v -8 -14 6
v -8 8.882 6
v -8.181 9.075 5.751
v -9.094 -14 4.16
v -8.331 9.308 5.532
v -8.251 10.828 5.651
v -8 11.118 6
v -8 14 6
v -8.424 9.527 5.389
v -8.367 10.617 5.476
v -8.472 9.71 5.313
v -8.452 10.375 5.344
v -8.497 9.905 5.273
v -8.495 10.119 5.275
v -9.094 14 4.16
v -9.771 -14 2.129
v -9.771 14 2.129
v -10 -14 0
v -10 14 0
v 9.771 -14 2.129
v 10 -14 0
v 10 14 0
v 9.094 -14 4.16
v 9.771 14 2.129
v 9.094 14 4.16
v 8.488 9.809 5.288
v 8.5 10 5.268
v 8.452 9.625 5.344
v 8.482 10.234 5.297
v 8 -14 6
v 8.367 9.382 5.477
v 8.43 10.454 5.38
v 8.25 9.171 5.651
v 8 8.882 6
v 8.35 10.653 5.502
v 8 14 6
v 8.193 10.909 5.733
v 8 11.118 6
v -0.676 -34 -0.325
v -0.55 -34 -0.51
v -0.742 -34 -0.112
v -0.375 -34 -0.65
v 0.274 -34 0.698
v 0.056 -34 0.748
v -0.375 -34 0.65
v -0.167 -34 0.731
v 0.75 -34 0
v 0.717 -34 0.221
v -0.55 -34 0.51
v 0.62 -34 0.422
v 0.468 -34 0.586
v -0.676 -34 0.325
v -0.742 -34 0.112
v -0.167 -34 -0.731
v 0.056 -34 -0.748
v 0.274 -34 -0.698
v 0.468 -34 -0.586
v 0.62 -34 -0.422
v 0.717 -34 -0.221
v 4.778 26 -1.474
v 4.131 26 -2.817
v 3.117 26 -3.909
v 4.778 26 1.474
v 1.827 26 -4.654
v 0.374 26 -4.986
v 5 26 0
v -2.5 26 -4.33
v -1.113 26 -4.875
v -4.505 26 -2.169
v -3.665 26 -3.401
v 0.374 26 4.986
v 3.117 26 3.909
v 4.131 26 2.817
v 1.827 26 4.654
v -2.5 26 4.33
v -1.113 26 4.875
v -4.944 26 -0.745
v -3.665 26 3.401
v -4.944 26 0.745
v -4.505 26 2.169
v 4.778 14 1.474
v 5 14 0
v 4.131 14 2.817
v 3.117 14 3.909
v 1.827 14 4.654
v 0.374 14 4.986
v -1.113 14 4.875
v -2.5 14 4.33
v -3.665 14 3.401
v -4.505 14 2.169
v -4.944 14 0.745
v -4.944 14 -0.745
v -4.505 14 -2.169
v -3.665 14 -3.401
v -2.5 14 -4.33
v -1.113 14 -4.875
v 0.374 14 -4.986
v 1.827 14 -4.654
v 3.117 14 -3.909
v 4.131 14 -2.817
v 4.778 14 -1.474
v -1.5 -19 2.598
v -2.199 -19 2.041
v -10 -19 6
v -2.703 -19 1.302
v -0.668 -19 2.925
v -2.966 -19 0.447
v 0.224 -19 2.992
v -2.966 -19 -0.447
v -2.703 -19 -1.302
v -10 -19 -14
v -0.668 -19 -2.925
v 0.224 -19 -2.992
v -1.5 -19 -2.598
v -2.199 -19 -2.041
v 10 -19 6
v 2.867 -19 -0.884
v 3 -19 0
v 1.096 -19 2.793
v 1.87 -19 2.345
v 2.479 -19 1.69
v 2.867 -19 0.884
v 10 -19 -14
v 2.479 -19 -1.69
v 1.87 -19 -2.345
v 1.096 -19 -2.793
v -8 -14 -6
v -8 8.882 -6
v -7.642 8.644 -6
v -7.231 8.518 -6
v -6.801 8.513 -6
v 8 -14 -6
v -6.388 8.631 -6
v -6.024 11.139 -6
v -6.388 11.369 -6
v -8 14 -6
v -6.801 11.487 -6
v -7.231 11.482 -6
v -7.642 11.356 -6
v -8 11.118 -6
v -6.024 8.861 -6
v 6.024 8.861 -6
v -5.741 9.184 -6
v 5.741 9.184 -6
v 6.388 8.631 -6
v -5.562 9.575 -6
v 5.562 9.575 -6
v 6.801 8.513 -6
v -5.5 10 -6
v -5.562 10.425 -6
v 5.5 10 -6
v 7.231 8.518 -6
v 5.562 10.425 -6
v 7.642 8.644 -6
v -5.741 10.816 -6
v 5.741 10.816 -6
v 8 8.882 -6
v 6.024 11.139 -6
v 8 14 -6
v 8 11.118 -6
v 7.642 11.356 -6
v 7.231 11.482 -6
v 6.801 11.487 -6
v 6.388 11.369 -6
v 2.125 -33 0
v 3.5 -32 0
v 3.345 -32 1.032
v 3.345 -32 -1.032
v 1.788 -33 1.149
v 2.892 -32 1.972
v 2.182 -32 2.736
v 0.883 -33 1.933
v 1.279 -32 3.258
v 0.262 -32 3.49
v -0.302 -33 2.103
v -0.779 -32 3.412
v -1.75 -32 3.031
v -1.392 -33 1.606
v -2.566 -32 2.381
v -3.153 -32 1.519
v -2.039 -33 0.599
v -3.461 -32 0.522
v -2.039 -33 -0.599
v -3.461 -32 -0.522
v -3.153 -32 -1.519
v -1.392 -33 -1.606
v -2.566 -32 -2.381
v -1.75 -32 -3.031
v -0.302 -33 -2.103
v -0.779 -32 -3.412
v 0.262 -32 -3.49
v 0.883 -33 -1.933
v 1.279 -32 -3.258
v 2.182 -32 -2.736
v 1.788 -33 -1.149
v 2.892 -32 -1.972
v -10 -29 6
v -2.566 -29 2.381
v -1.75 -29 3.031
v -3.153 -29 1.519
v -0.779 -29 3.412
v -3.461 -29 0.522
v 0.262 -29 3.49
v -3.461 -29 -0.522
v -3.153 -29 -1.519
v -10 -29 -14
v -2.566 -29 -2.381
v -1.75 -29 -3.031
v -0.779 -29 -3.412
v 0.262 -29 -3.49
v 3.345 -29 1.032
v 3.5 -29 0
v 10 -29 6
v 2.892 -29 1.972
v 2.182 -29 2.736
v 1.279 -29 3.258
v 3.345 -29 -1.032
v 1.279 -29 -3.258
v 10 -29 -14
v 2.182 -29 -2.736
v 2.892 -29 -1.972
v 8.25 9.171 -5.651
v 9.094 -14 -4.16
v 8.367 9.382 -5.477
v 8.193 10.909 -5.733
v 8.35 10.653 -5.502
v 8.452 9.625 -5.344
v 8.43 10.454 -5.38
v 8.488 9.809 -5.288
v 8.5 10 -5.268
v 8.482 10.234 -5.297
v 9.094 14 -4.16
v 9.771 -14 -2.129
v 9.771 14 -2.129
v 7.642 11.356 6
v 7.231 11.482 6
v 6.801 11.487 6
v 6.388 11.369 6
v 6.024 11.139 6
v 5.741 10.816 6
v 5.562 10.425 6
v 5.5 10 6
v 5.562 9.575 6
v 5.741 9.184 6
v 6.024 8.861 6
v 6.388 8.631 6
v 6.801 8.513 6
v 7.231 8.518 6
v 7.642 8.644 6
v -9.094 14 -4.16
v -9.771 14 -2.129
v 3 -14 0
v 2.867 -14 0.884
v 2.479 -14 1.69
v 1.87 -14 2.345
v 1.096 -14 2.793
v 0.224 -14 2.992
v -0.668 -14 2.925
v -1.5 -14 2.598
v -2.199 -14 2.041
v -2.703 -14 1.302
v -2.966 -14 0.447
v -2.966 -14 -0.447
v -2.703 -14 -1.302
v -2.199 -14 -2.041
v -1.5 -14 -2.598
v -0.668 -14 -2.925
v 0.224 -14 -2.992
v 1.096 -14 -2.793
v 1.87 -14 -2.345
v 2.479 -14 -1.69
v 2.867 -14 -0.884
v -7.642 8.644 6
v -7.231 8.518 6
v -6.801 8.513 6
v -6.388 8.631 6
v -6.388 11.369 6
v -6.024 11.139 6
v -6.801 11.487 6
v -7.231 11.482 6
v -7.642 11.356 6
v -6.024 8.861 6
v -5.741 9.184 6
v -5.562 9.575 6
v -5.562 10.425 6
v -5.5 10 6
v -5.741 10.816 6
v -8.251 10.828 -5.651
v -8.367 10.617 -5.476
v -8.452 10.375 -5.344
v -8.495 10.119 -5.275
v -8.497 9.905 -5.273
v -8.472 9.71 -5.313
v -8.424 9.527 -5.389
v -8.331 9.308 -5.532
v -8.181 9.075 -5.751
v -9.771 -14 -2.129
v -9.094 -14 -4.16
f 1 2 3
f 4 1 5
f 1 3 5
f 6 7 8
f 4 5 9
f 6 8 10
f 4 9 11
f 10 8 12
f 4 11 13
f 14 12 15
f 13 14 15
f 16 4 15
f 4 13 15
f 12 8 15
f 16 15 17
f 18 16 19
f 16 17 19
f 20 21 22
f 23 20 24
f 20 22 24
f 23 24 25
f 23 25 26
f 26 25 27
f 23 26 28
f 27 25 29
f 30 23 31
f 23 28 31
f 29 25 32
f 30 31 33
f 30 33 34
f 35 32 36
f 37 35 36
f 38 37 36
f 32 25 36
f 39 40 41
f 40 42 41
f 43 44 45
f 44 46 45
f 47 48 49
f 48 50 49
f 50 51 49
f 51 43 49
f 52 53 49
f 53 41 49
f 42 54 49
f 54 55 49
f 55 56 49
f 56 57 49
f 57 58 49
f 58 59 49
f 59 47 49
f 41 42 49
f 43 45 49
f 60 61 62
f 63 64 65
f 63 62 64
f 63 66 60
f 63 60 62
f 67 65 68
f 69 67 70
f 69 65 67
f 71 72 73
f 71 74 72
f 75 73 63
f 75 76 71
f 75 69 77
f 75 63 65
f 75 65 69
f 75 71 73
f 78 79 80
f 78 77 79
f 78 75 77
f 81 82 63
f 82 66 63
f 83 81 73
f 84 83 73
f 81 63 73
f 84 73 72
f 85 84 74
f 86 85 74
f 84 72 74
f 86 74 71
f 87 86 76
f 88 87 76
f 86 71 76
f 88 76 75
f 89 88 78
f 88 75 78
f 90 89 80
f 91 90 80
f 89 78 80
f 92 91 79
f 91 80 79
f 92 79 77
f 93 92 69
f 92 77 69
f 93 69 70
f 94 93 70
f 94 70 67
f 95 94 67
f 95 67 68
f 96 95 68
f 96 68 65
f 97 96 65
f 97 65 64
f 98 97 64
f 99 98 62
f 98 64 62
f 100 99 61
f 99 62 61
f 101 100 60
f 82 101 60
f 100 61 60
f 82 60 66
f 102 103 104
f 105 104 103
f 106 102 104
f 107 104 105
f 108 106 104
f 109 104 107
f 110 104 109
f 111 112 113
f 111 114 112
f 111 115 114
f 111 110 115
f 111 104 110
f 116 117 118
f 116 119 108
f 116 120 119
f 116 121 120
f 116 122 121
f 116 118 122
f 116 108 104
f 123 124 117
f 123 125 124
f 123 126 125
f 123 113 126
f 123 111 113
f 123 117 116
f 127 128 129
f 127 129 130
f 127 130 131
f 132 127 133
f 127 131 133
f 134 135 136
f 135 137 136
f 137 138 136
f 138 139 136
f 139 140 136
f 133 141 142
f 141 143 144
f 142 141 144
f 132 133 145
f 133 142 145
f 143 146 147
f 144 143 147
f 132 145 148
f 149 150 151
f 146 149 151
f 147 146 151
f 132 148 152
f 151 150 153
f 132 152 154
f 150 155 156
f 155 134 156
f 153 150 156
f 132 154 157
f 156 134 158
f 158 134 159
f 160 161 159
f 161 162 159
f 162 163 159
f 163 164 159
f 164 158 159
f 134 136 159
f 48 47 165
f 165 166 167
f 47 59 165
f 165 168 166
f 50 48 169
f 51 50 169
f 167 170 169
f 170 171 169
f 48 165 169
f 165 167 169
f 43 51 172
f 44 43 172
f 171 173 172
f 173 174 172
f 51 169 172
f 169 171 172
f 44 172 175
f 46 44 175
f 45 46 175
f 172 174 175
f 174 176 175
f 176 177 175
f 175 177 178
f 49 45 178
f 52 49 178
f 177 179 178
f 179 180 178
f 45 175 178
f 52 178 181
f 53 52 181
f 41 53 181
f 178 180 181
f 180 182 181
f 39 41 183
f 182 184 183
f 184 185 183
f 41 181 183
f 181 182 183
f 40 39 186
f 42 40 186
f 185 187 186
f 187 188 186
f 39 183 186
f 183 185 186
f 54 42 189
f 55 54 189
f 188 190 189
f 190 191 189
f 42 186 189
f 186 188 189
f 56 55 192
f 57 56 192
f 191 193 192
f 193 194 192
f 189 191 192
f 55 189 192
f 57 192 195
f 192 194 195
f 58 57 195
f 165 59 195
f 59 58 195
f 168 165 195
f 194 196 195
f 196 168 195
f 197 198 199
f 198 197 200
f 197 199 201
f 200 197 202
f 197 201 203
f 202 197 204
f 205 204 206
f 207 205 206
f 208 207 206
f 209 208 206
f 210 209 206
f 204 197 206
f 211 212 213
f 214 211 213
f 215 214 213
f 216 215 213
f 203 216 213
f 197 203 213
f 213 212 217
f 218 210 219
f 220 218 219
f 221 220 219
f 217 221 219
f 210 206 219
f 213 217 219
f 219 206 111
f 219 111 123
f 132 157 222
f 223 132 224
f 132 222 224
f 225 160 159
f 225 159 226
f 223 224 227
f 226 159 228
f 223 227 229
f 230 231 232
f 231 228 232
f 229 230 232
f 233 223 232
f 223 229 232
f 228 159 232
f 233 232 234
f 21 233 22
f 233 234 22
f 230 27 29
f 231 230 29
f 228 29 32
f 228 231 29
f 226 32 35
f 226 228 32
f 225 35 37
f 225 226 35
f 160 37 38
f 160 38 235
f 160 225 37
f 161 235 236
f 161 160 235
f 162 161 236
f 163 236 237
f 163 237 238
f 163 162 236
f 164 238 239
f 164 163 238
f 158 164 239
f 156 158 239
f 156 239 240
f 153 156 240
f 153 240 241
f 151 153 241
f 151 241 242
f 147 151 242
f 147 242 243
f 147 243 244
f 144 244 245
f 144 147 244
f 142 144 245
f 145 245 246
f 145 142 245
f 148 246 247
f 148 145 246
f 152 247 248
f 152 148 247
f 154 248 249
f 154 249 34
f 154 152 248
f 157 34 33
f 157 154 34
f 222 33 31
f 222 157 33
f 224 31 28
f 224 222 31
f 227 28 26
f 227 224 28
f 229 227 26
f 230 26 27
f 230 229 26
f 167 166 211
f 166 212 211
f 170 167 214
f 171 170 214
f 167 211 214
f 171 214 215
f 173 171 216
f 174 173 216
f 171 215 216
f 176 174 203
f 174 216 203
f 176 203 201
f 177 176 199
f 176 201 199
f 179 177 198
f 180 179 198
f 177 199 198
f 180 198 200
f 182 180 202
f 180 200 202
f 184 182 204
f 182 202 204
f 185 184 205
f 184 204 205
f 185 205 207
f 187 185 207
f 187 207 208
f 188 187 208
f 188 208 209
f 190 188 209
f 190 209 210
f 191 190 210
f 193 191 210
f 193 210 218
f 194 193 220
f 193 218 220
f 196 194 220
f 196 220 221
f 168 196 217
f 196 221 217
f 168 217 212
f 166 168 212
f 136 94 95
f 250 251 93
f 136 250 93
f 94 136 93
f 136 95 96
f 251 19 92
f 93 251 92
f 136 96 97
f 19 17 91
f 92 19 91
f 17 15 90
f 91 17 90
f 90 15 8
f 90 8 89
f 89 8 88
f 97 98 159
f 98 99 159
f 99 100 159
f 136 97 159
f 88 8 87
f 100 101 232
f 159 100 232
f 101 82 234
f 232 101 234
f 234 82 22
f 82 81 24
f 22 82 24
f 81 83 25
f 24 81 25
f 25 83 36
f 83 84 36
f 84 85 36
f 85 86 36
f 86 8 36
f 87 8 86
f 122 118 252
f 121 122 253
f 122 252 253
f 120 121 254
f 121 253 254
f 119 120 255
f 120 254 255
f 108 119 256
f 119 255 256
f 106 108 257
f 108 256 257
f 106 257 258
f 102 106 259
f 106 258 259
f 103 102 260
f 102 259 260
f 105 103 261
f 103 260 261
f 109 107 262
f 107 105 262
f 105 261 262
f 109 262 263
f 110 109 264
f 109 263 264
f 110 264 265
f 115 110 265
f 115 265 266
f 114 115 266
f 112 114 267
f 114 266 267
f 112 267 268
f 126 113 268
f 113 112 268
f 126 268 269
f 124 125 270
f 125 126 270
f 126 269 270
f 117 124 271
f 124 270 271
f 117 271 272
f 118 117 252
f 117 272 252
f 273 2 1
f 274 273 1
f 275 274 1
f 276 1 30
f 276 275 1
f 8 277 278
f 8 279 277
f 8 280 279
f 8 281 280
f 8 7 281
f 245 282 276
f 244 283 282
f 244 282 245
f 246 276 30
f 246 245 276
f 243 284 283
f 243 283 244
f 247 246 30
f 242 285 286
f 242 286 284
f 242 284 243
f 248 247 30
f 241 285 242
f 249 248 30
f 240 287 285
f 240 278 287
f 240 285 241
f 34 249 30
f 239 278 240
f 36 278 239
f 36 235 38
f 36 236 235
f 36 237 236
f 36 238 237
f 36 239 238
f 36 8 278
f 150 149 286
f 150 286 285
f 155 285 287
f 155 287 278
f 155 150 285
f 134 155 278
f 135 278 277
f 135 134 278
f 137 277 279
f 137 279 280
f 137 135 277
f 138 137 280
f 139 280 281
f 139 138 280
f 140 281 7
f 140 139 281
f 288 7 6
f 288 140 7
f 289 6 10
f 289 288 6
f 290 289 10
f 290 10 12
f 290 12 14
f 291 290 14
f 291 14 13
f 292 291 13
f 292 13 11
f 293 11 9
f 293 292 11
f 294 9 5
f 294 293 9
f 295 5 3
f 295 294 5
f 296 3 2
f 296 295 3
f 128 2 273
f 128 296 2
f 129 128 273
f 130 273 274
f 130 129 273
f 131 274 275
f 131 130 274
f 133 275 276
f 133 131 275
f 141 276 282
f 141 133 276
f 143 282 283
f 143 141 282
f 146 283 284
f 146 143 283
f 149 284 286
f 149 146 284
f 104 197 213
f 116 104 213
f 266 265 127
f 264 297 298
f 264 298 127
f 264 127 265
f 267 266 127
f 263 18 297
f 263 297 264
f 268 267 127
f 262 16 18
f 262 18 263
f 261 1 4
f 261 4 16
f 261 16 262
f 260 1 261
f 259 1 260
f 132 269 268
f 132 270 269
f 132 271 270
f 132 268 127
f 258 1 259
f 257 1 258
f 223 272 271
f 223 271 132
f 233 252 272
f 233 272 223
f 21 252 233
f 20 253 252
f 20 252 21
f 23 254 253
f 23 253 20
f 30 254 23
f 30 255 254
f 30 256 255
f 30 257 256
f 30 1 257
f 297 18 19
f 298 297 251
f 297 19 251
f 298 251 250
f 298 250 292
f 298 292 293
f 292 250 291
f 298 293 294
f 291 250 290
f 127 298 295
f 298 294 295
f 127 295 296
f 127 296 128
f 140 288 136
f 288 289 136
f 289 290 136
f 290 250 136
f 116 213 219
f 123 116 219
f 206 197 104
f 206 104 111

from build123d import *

# Parameters (mm, degrees)
ESBO_O1_W                = 20
ESBO_O1_H                = 28
ESBO_O1_R                = 1.5
RESSALTO_EXTRUS_O1_DEPTH = 6
ESBO_O2_W                = 5
ESBO_O2_H                = 12
RESSALTO_EXTRUS_O2_START = -29
ESBO_O3_W                = 20
ESBO_O3_H                = 20
RESSALTO_EXTRUS_O2_DEPTH = 10
CORTE_EXTRUS_O1_DEPTH    = 28


with BuildPart() as part:
    # Esboço1 → Ressalto-extrusão1 (new body, symmetric)
    with BuildSketch(Plane.XY):
        Rectangle(ESBO_O1_W, ESBO_O1_H)
        with Locations((-7, 10)):
            Circle(ESBO_O1_R, mode=Mode.SUBTRACT)
        with Locations((7, 10)):
            Circle(ESBO_O1_R, mode=Mode.SUBTRACT)
    extrude(amount=RESSALTO_EXTRUS_O1_DEPTH, both=True)

    # Esboço2 → Revolução1 (revolve)
    with BuildSketch(Plane.XY):
        Polygon((3, -29), (3, -19), (3, -14), (0, -14), (0, -34), (0.75, -34), (3.5, -32), (3.5, -29), align=None)
        with Locations((2.5, 20)):
            Rectangle(ESBO_O2_W, ESBO_O2_H)
    revolve(axis=Axis((0, 0, 0), (0, -1, 0)))

    # Esboço3 → Ressalto-extrusão2 (add)
    with BuildSketch(Plane(origin=(0, 0, 0), x_dir=(1, 0, 0), z_dir=(0, 1, 0)).offset(RESSALTO_EXTRUS_O2_START)):
        with Locations((0, 4)):
            Rectangle(ESBO_O3_W, ESBO_O3_H)
    extrude(amount=RESSALTO_EXTRUS_O2_DEPTH)

    # Esboço4 → Corte-extrusão1 (cut)
    with BuildSketch(Plane(origin=(0, 14, 0), x_dir=(1, 0, 0), z_dir=(0, 1, 0))):
        with BuildLine():
            ThreePointArc((-10, 0), (-9.486832981, 3.16227766), (-8, 6))
            Line((-8, 6), (-10, 6))
            Line((-10, 6), (-10, 0))
        make_face()
        with BuildLine():
            ThreePointArc((-8, -6), (-9.486832981, -3.16227766), (-10, 0))
            Line((-10, 0), (-10, -6))
            Line((-10, -6), (-8, -6))
        make_face()
        with BuildLine():
            Line((10, -6), (10, 0))
            ThreePointArc((10, 0), (9.486832981, -3.16227766), (8, -6))
            Line((8, -6), (10, -6))
        make_face()
        with BuildLine():
            Line((10, 6), (8, 6))
            ThreePointArc((8, 6), (9.486832981, 3.16227766), (10, 0))
            Line((10, 0), (10, 6))
        make_face()
    extrude(amount=-CORTE_EXTRUS_O1_DEPTH, mode=Mode.SUBTRACT)


solid = part.part
